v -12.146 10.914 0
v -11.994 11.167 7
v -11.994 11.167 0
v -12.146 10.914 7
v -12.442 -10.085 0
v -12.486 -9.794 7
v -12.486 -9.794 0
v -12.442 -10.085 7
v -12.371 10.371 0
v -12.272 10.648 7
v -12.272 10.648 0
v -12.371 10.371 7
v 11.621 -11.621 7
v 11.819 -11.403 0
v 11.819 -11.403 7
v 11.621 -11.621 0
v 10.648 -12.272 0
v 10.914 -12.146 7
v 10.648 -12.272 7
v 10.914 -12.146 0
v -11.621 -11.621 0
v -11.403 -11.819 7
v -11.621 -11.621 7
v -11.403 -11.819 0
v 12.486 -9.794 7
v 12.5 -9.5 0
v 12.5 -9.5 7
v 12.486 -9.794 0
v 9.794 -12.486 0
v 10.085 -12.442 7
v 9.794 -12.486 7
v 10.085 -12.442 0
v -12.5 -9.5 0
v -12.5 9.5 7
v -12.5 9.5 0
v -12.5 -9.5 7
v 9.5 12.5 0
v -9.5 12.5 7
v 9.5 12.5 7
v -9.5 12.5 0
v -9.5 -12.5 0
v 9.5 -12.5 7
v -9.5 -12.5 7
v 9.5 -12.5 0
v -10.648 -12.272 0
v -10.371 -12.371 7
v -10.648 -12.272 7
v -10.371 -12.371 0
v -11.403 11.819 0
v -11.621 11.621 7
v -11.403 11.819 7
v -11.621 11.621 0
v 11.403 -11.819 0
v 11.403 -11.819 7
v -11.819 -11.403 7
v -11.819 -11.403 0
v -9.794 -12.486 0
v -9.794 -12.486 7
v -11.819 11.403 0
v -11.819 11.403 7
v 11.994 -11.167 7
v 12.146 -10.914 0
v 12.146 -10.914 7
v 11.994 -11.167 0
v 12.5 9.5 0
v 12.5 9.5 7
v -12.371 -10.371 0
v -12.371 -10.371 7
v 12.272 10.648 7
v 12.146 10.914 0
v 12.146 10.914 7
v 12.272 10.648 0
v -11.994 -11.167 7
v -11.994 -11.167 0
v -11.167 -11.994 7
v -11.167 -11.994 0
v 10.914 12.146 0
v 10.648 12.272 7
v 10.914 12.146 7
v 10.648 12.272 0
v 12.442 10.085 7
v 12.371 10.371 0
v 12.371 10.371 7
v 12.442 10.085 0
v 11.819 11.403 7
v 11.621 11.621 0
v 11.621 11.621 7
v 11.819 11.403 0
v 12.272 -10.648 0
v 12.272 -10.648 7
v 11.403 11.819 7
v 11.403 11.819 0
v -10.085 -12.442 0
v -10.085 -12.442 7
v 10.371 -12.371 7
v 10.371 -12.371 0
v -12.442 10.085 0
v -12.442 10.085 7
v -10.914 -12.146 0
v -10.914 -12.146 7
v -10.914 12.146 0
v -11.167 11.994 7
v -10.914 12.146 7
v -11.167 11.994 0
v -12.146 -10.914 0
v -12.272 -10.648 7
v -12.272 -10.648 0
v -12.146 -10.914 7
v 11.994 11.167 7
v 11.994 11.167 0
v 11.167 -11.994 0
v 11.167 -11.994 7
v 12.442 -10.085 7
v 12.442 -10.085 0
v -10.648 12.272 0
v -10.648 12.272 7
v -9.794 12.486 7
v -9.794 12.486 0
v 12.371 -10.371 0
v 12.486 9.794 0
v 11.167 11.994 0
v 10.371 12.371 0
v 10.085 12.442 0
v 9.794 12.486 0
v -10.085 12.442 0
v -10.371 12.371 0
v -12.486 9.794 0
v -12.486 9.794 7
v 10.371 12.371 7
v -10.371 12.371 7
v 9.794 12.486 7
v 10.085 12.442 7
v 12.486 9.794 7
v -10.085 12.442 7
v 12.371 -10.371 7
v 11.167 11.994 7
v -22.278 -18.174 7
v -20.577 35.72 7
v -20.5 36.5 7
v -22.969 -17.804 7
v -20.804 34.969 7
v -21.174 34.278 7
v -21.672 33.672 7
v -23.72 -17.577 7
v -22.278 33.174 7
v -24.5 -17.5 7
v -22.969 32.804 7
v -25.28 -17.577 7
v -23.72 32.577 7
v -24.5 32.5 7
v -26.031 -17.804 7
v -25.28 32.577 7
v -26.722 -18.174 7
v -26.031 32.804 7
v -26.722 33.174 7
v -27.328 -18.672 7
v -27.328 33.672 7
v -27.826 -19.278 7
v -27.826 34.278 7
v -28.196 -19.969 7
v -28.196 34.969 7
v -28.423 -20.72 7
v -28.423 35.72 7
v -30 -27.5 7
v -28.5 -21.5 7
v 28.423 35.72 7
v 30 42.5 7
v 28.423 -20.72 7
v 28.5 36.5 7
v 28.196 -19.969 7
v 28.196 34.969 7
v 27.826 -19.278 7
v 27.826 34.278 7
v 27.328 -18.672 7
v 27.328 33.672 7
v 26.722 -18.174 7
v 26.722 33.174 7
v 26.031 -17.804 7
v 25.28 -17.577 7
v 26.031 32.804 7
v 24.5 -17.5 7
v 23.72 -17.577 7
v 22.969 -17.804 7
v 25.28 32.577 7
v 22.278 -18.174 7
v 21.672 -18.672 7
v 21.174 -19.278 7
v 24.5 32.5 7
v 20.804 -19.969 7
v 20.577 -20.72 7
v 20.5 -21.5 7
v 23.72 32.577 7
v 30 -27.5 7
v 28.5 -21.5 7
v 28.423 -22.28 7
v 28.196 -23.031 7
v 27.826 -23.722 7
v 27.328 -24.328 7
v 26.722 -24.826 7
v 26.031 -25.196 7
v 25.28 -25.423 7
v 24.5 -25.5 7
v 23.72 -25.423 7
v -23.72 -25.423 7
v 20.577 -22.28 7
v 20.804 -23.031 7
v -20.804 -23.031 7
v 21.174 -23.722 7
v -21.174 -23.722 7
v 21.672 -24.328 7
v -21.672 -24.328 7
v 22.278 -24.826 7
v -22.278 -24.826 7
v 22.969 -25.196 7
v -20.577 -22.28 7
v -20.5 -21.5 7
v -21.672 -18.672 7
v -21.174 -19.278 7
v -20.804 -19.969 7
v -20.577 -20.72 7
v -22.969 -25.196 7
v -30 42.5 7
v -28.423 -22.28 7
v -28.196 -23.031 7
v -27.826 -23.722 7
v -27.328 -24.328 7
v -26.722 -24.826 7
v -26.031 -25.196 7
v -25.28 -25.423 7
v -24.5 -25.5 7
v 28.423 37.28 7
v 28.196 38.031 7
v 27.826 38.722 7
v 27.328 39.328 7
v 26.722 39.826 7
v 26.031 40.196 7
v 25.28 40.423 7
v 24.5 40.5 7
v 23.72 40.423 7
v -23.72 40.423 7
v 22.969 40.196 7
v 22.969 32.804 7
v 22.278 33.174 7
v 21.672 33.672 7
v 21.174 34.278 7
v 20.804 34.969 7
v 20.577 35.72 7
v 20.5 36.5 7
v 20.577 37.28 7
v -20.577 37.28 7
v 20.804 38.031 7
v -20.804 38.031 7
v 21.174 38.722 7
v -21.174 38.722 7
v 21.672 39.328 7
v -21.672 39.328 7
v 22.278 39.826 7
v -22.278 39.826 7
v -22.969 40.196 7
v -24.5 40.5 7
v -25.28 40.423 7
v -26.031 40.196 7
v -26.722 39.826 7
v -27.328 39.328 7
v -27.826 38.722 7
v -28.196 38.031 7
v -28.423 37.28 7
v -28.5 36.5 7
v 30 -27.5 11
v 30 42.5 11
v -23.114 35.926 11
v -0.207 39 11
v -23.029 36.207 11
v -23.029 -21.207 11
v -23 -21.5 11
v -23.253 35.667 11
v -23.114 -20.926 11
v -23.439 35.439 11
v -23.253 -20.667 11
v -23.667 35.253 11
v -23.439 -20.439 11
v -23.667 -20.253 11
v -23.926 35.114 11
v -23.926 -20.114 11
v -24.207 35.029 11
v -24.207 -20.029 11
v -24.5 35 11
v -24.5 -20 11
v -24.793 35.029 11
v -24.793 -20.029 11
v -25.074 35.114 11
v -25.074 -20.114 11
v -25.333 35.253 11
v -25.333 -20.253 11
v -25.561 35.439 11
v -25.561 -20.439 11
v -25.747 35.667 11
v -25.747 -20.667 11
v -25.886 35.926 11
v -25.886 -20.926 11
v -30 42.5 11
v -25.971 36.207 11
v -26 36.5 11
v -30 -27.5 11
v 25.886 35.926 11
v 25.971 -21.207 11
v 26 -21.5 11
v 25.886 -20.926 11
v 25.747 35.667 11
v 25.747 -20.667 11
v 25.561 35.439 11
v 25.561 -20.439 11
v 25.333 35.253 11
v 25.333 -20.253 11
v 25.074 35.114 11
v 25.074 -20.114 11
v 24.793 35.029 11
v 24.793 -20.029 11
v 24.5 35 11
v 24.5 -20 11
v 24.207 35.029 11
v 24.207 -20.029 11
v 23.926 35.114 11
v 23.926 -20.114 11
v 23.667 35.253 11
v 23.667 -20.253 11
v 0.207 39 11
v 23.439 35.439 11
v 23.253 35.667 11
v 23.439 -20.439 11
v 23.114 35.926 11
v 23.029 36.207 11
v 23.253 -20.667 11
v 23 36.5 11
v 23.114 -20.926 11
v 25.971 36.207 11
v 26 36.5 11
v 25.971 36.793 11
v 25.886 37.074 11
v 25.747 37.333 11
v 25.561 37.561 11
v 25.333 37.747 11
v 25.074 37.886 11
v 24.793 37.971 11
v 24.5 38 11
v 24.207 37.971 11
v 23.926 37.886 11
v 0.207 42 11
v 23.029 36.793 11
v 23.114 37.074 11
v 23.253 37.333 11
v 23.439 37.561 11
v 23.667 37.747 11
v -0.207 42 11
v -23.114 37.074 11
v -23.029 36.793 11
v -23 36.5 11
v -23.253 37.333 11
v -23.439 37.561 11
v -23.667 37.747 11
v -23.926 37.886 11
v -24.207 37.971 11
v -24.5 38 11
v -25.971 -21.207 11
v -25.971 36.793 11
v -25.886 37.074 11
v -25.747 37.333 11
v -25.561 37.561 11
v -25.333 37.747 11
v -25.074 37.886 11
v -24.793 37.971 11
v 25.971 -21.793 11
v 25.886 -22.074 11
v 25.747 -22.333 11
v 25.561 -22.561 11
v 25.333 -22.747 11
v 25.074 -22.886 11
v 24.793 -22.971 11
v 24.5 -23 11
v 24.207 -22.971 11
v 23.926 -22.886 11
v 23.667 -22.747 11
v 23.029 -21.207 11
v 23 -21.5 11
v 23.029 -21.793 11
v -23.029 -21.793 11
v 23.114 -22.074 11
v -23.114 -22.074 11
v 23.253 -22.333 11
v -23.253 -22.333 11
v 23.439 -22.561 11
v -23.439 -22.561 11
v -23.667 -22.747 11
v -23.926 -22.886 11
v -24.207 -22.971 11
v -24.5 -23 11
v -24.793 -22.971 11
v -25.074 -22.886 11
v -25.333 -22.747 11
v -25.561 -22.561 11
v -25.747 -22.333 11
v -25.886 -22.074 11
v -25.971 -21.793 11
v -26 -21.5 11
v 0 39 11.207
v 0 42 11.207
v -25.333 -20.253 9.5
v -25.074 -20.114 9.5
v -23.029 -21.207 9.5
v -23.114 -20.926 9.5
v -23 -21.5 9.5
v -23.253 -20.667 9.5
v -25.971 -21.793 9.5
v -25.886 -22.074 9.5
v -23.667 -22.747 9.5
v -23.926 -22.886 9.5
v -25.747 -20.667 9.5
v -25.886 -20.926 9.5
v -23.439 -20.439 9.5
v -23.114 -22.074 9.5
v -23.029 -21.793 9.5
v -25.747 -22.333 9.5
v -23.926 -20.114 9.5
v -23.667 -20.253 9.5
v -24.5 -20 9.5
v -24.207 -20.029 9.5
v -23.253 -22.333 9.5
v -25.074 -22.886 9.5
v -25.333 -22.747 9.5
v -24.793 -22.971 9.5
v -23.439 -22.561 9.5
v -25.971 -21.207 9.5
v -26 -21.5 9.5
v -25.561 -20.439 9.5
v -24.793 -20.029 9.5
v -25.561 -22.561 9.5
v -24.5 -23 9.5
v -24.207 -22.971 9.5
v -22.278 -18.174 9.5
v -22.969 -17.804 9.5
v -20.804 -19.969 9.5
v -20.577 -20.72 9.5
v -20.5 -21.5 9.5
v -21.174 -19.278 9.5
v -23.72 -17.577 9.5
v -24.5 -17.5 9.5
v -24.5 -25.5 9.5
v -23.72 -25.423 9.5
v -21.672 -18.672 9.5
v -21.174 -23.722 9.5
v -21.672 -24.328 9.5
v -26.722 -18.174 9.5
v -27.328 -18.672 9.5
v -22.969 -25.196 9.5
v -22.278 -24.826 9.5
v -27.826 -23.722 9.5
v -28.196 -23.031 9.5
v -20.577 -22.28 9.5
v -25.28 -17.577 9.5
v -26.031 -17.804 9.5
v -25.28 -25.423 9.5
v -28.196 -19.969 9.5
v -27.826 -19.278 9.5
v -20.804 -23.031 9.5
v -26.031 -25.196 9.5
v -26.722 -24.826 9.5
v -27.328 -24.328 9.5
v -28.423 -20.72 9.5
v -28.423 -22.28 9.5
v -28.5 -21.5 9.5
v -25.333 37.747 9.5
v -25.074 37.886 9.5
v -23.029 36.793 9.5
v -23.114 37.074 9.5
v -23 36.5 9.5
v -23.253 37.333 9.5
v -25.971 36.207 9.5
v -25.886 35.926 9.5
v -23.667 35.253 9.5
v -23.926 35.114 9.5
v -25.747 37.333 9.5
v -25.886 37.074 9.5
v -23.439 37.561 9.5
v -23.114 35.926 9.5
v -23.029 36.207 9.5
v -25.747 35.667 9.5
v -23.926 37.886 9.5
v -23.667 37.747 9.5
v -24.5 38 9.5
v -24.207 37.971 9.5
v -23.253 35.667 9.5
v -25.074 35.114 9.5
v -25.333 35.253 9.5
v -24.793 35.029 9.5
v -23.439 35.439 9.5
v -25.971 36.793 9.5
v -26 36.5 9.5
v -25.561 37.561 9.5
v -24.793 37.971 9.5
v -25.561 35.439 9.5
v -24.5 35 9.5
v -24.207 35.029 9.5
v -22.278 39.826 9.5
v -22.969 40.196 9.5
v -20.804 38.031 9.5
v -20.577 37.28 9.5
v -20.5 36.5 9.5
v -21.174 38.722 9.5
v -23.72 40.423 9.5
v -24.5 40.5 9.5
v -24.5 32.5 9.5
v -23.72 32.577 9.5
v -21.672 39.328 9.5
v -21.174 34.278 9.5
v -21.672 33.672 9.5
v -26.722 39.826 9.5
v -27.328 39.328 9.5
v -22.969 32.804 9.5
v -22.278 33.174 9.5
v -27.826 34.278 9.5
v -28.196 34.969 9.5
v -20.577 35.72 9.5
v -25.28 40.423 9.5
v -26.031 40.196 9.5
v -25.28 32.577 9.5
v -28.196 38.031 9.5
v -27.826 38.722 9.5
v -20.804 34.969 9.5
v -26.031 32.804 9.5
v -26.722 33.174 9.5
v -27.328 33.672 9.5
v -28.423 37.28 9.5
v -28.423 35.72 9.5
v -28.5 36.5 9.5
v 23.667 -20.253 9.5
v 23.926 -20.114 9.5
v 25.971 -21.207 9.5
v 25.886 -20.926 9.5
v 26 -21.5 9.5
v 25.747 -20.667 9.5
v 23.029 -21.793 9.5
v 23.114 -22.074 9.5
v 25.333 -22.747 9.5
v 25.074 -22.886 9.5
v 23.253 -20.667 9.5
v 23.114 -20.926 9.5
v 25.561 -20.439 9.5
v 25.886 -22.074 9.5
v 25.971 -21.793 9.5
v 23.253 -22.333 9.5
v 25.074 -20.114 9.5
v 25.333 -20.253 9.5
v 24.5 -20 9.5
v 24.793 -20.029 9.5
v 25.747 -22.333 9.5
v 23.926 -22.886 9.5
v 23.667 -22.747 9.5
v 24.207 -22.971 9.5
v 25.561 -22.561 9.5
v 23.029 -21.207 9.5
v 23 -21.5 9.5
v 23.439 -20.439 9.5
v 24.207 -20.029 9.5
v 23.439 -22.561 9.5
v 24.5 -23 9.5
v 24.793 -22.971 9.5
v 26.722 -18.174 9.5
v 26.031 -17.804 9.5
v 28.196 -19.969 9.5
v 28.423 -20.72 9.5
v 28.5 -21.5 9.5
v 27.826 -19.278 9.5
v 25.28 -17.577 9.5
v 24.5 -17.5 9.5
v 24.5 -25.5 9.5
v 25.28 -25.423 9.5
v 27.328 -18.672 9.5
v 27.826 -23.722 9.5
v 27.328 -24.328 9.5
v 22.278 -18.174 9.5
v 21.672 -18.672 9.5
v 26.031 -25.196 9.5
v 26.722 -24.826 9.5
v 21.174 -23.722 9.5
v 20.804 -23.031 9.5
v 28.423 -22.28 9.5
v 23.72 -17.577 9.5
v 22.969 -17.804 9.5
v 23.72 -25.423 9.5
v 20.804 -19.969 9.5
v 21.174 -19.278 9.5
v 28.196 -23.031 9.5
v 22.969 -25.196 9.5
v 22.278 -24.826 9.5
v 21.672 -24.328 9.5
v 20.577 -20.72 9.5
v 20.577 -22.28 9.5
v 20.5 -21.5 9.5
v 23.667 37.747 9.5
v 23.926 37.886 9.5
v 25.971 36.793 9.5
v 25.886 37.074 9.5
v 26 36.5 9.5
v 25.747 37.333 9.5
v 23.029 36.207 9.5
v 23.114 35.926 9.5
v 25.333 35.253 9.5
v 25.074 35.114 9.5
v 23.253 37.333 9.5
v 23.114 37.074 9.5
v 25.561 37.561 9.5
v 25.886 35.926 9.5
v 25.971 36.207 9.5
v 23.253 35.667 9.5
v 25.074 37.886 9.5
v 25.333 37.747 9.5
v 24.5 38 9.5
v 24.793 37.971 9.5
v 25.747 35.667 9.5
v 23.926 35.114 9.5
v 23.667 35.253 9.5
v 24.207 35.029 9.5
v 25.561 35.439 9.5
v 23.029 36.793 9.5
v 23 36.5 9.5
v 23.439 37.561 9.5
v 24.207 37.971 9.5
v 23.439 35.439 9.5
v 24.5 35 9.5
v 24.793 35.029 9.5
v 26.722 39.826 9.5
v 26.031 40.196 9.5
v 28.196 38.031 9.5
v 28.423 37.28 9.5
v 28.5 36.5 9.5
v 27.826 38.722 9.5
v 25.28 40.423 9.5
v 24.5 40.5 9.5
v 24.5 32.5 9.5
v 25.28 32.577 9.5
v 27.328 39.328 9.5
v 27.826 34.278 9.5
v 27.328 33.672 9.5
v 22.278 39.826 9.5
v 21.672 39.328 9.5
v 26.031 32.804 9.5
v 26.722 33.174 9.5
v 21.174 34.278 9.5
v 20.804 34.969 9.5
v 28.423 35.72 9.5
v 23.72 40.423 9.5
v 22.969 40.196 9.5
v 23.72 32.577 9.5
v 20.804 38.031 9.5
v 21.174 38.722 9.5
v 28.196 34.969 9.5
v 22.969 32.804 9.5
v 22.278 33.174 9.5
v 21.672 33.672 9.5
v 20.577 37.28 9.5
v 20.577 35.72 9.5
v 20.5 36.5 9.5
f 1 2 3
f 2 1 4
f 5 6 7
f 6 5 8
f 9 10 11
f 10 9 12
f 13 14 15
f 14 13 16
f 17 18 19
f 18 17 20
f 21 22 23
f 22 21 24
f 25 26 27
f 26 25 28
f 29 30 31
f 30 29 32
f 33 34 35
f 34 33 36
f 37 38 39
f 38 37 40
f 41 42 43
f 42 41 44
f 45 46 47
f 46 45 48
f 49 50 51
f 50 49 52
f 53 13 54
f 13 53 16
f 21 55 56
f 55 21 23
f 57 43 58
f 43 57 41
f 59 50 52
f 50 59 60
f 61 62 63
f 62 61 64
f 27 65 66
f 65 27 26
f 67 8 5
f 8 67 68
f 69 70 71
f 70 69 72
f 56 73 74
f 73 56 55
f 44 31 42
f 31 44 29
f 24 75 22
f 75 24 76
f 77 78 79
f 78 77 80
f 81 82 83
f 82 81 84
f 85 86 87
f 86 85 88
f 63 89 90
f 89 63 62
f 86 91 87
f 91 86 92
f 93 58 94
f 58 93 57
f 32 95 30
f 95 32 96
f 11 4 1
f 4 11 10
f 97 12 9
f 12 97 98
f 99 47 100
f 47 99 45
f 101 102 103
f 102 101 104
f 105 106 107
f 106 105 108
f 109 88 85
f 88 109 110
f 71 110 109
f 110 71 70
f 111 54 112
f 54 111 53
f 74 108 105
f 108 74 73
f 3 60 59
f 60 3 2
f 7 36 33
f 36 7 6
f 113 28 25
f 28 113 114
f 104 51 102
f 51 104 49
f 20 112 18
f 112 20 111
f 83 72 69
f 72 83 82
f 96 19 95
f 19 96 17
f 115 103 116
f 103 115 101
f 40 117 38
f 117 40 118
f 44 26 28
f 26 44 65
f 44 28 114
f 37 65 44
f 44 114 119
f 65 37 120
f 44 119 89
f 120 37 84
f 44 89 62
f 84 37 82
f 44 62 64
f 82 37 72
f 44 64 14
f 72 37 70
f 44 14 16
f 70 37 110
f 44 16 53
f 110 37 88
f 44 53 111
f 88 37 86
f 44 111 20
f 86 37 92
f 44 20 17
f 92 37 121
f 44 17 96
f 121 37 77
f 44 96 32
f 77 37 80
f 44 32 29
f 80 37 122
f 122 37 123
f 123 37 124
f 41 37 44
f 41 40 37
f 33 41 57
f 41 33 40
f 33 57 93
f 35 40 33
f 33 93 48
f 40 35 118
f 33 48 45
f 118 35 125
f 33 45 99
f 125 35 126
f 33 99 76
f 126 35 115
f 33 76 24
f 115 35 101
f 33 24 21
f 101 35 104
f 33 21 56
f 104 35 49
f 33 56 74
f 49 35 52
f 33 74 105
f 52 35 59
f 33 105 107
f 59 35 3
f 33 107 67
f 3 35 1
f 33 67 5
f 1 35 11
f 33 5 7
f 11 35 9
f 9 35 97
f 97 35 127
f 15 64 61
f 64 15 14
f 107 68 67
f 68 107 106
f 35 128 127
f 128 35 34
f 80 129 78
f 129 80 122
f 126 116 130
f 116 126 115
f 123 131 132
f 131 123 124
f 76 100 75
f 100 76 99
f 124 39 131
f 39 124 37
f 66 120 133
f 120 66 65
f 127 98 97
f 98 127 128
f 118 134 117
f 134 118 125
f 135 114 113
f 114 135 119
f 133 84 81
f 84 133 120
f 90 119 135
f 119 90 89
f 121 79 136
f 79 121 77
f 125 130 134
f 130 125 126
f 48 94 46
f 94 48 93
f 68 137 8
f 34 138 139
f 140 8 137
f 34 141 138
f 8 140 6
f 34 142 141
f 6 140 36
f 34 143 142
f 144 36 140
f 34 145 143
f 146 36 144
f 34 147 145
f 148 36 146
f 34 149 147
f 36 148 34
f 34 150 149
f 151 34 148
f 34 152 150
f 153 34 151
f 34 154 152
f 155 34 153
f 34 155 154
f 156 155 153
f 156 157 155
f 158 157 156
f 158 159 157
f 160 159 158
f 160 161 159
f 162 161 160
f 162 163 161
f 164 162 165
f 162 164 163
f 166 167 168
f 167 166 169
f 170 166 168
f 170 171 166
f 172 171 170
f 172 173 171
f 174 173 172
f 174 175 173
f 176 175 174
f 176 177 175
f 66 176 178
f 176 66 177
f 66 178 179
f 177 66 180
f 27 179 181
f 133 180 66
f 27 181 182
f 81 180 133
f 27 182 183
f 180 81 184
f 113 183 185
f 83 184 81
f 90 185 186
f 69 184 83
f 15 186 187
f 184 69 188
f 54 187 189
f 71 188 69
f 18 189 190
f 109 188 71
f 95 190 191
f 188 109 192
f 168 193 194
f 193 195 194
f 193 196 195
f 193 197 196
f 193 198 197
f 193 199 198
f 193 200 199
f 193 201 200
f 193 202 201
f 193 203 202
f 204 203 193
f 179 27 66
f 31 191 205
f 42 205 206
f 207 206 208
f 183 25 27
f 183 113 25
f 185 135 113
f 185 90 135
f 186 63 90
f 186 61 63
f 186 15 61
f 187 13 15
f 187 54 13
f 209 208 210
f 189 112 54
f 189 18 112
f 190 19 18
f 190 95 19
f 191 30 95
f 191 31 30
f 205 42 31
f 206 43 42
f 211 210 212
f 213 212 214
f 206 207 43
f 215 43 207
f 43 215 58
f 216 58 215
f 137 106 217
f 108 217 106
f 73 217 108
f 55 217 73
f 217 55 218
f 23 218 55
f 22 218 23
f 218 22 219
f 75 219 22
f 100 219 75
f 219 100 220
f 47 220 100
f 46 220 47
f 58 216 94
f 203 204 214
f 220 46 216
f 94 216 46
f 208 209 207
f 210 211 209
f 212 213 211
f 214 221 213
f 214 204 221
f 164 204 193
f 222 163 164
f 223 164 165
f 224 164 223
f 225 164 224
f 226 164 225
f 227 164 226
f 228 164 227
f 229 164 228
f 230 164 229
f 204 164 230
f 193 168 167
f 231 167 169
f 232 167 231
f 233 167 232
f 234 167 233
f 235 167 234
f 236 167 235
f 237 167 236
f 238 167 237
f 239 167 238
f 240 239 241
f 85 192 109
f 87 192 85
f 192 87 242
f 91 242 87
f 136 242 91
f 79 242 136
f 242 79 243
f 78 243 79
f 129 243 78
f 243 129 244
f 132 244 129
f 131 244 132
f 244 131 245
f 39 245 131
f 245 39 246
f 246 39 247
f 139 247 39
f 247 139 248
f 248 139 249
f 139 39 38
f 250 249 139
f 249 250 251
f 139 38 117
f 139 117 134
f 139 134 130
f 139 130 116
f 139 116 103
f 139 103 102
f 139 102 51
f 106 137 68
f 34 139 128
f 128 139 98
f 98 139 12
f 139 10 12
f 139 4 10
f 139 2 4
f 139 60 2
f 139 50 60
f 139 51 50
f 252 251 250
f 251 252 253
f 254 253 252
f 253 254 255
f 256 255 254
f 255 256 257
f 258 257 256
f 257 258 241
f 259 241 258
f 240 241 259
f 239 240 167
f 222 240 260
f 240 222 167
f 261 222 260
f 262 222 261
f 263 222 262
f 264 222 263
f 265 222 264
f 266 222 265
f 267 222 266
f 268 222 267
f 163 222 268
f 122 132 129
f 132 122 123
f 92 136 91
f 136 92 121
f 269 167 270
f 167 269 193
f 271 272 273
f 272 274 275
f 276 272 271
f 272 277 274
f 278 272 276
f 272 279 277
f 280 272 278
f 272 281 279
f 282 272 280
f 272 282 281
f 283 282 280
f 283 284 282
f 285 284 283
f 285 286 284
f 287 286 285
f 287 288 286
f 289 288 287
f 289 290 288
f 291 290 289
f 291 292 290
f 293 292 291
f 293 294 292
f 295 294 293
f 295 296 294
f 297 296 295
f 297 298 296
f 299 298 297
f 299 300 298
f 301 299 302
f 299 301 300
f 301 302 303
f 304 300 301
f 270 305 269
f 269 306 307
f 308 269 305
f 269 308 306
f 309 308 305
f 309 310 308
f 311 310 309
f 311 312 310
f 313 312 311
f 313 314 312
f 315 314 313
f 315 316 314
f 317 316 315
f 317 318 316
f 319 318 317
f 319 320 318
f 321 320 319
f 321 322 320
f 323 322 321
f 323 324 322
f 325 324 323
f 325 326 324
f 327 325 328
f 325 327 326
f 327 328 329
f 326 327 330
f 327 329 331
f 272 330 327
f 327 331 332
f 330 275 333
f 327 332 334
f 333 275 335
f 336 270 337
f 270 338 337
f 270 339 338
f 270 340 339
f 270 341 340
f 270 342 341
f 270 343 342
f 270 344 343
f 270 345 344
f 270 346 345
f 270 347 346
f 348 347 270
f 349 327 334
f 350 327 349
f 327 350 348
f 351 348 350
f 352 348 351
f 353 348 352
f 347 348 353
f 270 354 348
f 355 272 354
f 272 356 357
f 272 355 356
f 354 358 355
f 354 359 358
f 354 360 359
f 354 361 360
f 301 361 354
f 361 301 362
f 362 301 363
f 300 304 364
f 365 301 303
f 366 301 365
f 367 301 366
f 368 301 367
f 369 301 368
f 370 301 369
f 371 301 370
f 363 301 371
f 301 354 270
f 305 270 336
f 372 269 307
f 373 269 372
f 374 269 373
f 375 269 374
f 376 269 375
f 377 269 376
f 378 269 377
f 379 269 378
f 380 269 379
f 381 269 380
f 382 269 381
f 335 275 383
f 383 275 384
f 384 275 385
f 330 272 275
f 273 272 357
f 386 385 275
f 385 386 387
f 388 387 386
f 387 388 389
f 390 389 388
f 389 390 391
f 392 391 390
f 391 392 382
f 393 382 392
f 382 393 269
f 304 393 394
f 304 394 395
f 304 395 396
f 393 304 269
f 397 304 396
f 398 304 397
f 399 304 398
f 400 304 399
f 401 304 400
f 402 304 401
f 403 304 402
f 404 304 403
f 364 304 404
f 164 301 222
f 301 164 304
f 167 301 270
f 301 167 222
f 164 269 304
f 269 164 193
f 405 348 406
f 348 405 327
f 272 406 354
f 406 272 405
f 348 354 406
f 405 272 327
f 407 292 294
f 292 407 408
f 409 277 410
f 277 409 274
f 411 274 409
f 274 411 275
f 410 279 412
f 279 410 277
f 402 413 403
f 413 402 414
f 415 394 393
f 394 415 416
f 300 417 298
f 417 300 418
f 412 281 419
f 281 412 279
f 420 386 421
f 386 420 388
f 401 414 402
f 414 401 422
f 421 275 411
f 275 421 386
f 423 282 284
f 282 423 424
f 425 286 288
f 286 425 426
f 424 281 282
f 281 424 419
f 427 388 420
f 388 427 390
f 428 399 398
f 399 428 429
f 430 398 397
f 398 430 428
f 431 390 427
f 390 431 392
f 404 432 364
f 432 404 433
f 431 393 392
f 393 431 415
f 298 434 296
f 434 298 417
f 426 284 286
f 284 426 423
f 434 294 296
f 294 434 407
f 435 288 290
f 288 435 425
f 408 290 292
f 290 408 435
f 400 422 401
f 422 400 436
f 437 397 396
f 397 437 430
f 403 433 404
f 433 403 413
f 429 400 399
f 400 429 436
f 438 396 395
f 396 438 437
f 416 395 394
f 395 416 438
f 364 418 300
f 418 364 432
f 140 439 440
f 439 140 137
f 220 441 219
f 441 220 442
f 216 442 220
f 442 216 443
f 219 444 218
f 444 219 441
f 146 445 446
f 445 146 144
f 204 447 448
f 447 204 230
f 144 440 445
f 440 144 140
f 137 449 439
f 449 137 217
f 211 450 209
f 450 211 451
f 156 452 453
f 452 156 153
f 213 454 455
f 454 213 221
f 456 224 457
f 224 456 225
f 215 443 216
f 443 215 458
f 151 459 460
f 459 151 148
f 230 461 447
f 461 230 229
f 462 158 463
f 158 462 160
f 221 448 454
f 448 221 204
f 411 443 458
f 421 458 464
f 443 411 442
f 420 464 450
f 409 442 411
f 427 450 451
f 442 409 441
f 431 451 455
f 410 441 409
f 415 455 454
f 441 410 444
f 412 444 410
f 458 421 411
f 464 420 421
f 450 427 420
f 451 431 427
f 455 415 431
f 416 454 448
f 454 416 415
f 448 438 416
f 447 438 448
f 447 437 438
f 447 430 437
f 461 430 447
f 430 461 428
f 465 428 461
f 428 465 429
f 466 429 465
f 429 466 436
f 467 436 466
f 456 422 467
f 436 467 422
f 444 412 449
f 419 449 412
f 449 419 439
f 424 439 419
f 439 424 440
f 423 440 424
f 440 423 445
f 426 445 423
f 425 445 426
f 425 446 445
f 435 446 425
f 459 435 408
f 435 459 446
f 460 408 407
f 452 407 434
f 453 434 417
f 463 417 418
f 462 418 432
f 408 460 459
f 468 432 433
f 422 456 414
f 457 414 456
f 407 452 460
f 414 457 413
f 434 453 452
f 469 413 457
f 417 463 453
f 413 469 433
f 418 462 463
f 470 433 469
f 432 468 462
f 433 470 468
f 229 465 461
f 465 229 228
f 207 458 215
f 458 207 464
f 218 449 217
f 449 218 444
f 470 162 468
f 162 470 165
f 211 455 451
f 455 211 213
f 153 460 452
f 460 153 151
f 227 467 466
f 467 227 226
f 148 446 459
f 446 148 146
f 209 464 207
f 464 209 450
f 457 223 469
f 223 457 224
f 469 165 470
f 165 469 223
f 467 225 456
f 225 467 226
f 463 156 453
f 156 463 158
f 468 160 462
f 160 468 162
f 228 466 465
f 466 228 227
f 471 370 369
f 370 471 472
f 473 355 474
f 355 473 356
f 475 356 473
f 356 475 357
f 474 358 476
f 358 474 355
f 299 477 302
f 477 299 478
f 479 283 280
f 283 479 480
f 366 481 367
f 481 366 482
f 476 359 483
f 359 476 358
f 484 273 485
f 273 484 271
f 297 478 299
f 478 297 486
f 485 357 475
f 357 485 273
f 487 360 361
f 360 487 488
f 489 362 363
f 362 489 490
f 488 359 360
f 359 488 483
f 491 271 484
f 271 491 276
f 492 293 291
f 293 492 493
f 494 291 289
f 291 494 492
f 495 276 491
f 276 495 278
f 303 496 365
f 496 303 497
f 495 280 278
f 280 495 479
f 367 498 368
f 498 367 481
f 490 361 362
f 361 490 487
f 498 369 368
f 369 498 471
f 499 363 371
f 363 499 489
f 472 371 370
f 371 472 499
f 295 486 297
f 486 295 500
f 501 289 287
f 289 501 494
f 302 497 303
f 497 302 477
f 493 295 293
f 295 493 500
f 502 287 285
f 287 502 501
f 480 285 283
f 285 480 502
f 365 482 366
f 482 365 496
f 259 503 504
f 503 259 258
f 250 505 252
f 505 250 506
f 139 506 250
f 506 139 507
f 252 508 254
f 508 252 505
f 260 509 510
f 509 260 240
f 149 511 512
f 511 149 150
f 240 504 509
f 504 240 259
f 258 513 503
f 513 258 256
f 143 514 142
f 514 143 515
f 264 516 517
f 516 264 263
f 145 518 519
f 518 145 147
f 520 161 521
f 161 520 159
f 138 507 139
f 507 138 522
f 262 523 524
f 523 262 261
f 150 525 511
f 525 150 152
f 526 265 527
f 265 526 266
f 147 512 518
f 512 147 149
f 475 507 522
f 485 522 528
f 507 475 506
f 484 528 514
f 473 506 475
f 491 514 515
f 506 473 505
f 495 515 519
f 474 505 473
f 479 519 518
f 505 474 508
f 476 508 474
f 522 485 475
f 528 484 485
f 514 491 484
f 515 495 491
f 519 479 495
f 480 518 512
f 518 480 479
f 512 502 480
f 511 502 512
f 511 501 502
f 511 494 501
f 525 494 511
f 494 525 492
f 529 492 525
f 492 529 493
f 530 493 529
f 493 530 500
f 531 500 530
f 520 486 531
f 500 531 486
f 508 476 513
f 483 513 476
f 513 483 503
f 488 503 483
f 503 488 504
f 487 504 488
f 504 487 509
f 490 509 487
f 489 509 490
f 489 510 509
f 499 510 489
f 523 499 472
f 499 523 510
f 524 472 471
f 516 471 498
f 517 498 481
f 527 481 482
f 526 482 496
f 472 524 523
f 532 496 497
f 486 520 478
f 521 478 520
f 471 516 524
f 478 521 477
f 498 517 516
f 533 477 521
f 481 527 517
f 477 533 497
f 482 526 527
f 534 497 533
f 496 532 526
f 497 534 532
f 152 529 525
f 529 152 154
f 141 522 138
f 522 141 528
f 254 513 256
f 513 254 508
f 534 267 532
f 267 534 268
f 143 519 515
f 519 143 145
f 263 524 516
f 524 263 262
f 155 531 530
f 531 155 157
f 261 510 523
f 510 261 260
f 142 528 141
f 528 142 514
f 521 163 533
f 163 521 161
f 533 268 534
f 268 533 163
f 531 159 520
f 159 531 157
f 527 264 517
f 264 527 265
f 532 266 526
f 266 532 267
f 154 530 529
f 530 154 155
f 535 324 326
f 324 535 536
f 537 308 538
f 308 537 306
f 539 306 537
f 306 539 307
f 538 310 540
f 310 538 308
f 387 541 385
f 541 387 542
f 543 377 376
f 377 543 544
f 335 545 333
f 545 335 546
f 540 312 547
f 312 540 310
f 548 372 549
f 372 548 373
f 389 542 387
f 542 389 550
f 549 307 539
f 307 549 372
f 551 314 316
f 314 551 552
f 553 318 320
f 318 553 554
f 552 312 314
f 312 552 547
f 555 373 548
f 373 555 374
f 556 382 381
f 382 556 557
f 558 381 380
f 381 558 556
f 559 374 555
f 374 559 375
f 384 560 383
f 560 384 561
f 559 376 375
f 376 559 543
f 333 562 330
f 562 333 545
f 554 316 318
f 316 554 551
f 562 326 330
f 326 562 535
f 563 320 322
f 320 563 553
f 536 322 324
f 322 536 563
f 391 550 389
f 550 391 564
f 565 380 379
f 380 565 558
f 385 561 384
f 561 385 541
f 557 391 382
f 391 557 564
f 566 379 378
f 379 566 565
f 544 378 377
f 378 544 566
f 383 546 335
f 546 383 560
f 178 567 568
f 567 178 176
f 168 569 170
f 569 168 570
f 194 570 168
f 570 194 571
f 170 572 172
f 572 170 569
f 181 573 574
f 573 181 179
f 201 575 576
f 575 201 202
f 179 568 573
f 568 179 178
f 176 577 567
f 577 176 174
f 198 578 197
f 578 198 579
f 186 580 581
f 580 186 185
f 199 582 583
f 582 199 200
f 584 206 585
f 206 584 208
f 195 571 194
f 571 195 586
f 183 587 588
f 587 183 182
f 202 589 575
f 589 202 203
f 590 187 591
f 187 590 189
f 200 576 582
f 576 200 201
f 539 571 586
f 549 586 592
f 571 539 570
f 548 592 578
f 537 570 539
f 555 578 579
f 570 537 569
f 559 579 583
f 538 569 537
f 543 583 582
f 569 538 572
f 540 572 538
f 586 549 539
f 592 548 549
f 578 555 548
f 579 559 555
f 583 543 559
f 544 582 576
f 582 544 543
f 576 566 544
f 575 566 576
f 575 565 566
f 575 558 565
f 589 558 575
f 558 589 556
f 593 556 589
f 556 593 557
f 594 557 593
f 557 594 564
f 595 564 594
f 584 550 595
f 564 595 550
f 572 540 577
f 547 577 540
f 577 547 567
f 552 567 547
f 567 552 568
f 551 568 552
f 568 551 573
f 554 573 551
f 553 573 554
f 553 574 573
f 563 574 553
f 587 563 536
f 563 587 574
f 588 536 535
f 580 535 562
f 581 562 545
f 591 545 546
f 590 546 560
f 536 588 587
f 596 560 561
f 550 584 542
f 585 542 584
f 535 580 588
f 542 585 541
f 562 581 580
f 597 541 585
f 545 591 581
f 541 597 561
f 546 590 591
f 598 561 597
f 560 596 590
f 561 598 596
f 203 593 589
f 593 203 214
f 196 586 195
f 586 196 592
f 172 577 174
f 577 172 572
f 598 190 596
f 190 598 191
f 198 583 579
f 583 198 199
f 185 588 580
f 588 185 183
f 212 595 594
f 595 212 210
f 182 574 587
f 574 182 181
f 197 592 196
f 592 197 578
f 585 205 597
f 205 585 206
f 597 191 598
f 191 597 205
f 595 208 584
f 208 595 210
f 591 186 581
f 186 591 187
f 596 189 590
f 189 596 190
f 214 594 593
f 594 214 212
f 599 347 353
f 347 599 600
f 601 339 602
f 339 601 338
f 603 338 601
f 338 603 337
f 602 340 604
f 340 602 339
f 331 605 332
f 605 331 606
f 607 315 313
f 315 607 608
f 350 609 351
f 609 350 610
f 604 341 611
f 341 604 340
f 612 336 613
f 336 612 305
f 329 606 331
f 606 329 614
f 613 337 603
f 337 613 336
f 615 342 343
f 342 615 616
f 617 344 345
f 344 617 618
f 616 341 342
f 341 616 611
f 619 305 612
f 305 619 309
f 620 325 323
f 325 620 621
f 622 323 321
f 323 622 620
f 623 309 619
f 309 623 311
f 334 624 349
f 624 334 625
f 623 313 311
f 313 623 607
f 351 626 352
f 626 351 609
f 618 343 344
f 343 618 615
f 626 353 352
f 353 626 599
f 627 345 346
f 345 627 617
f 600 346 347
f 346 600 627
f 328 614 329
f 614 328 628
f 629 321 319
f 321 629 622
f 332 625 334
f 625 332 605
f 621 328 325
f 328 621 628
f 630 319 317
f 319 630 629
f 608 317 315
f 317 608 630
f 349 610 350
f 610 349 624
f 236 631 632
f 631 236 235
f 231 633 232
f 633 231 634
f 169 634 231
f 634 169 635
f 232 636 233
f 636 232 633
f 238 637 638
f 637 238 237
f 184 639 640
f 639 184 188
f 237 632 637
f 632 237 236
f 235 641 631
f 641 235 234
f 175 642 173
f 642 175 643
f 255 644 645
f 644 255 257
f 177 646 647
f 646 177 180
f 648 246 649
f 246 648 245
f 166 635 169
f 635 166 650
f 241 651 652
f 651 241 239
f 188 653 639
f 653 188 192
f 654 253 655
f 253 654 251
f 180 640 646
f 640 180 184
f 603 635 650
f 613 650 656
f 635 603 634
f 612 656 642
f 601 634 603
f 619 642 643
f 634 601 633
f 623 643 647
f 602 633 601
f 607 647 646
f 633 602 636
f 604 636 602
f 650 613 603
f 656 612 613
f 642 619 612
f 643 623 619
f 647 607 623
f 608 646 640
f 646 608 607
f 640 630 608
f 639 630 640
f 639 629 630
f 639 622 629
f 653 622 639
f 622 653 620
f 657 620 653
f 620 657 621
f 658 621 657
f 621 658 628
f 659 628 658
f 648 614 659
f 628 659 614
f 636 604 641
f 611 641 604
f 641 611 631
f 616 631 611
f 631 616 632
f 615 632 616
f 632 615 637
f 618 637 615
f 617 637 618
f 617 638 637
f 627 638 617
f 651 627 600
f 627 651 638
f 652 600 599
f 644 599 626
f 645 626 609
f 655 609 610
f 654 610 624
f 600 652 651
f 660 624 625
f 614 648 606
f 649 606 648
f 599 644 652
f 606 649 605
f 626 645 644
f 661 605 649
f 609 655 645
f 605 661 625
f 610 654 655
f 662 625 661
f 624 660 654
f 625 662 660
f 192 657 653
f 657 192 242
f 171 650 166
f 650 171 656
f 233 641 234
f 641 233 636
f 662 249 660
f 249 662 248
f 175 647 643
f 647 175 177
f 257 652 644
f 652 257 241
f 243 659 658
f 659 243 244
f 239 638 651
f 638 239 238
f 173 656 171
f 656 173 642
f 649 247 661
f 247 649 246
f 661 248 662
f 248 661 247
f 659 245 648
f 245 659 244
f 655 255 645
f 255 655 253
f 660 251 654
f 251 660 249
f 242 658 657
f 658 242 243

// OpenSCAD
// file: parts/support_column.scad
/*
 * Nomad Core - Support Column Module
 * Reusable support structure with rounded edges
 * 
 * Parameters are passed as function arguments
 */

// ============================================
// SUPPORT COLUMN MODULE
// ============================================
// Parameters:
// - size: footprint size (e.g., 25mm)
// - height: column height (e.g., 7mm)
// - corner_radius: rounded corner radius (e.g., 3mm)

module support_column(size=25, height=7, corner_radius=3) {
    // Solid hull with rounded corners
    hull() {
        // Four rounded corners
        for (x = [-1, 1]) {
            for (y = [-1, 1]) {
                translate([
                    x * (size/2 - corner_radius),
                    y * (size/2 - corner_radius),
                    0
                ])
                    cylinder(h=height, r=corner_radius, center=true);
            }
        }
    }
}

support_column();
// file: parts/screw_cutout.scad
/*
 * Nomad Core - Screw Cutout Module
 * M2.5 screw hole with hex nut recess access from bottom
 * 
 * Screw specs: M2.5 threading, 16mm long, TR8 hex head
 */

// ============================================
// MODULE: SCREW CUTOUT
// ============================================
module screw_cutout() {
    union() {
        // Screw shaft hole (3mm diameter, 25mm tall)
        // Full height to allow screw to pass through
        cylinder(h=25, d=3, center=false);
        
        // Hex nut recess (8mm diameter, 6mm tall)
        // Starts 4.5mm from bottom to create nut pocket
        translate([0, 0, 4.5])
            cylinder(h=6, d=8, center=false);
    }
}

// ============================================
// RENDER QUALITY
// ============================================
$fn = 32;

// ============================================
// TEST RENDER (comment out when using as module)
// ============================================
// Render the cutout for visualization
screw_cutout();

// Show a reference cube to see the cutout in context
%translate([0, 0, 5])
    cube([15, 15, 5], center=true);

// ============================================
// INFO OUTPUT
// ============================================
echo("=== SCREW CUTOUT SPECIFICATIONS ===");
echo("Screw standard: M2.5");
echo("Screw length: 16mm");
echo("Hex head: TR8");
echo("");
echo("Shaft hole: 3mm diameter x 25mm height");
echo("Nut recess: 8mm diameter x 6mm height (starts at 4.5mm)");
echo("");
echo("Usage: difference() { your_part(); screw_cutout(); }");
// main file
/*
 * Nomad Core - Initial Baseplate v1.0
 * Connects puck to Raspberry Pi 3B+
 * 
 * Design: 25x25mm support structure with rounded edges, 6.5mm clearance
 * Baseplate: 60mm wide x 70mm long, offset 7.5mm towards puck back (rounded edge)
 */

// Import reusable modules
use <parts/screw_cutout.scad>
use <parts/support_column.scad>

// ============================================
// BASEPLATE DIMENSIONS
// ============================================
// Raspberry Pi 3B+ dimensions and mounting
pi_width = 60.0;           // Baseplate width (X dimension, left-right)
pi_length = 70.0;          // Baseplate length (Y dimension, front-back)

// Hole edge offsets (measured from edges)
hole_offset_from_edge_x = 5.5;  // Distance from left/right edges (width/X direction)
hole_offset_from_edge_y = 6.0;  // Distance from front/back edges (length/Y direction)

// Calculated hole spacing (for reference)
pi_hole_spacing_x = 2 * (pi_width/2 - hole_offset_from_edge_x);   // 60-5.5-5.5 = 49mm (X/width)
pi_hole_spacing_y = 2 * (pi_length/2 - hole_offset_from_edge_y);  // 70-6-6 = 58mm (Y/length)

// Support structure (puck to baseplate)
support_size = 25.0;       // 25x25mm footprint on puck top
support_height = 7.0;      // Clearance above puck
support_thickness = 3.0;   // Wall thickness of support structure
support_corner_radius = 3.0;  // Rounded edges on support column

// Baseplate positioning (offset towards back/rounded edge of puck)
baseplate_offset_y = 7.5;  // Offset towards back (5-10mm range)

// Baseplate 
baseplate_width = pi_width;
baseplate_length = pi_length;
baseplate_thickness = 4.0; // Thickness of main platform

// Screw cutout positioning
screw_inset_from_bottom = -8.0;  // Hex nut recess inset from bottom

// ============================================
// RENDER QUALITY
// ============================================
$fn = 64;

// ============================================
// MAIN BASEPLATE
// ============================================
module baseplate_body() {
    // Main platform
    // Cube is [X, Y, Z] where X=width (left-right), Y=length (front-back)
    cube([baseplate_width, baseplate_length, baseplate_thickness], center=true);
}

// ============================================
// RASPBERRY PI MOUNTING HOLES (Pi 3B+ spacing)
// ============================================
module pi_mounting_holes() {
    // Calculate hole positions from baseplate center
    // Baseplate cube is [width, length, thickness] = [X, Y, Z]
    // So X dimension = width (60mm), Y dimension = length (70mm)
    
    // Holes are 5.5mm from left/right edges (width/X direction)
    hole_pos_x = baseplate_width/2 - hole_offset_from_edge_x;   // 60/2 - 5.5 = 24.5mm
    
    // Holes are 6mm from front/back edges (length/Y direction)  
    hole_pos_y = baseplate_length/2 - hole_offset_from_edge_y;  // 70/2 - 6 = 29mm
    
    for (x = [-1, 1]) {
        for (y = [-1, 1]) {
            translate([
                x * hole_pos_x,  // ±24.5mm in X (width direction)
                y * hole_pos_y,  // ±29mm in Y (length direction)
                -baseplate_thickness/2 + screw_inset_from_bottom
            ])
                screw_cutout();
        }
    }
}

// ============================================
// MAIN ASSEMBLY MODULE
// ============================================
module baseplate_initial() {
    difference() {
        union() {
            // Support column (centered at origin, bottom at z=0)
            translate([0, 0, support_height/2])
                support_column(support_size, support_height, support_corner_radius);
            
            // Baseplate platform (offset towards back/rounded edge of puck)
            translate([0, baseplate_offset_y, support_height + baseplate_thickness/2])
                baseplate_body();
            
            // Alignment marker (small notch for orientation on front edge)
            translate([0, baseplate_offset_y + baseplate_length/2 - 2, support_height + baseplate_thickness - 0.5])
                rotate([0, 45, 0])
                cube([1, 3, 1], center=true);
        }
        
        // Cut mounting holes from top (with baseplate offset)
        translate([0, baseplate_offset_y, support_height + baseplate_thickness/2])
            pi_mounting_holes();
    }
}

// ============================================
// RENDER (when file is opened directly)
// ============================================
baseplate_initial();

// ============================================
// INFO OUTPUT
// ============================================
echo("=== INITIAL BASEPLATE v1.0 - Pi 3B+ ===");
echo(str("Baseplate: ", baseplate_width, "mm (W) x ", baseplate_length, "mm (L) x ", baseplate_thickness, "mm (H)"));
echo(str("Support structure: ", support_size, " x ", support_size, " x ", support_height, " mm (rounded corners)"));
echo(str("Baseplate offset (towards puck back): ", baseplate_offset_y, " mm (Y direction)"));
echo(str("Total height: ", support_height + baseplate_thickness, " mm"));
echo(str("Pi 3B+ mounting hole spacing: ", pi_hole_spacing_x, "mm (X) x ", pi_hole_spacing_y, "mm (Y)"));
echo(str("Hole edge offsets: ", hole_offset_from_edge_x, "mm (left/right/X), ", hole_offset_from_edge_y, "mm (front/back/Y)"));
echo("");
echo("Screw spec: M2.5 x 16mm with TR8 hex head");
echo(str("Hex nut recess inset: ", screw_inset_from_bottom, " mm from bottom"));
echo("Orientation: Offset towards rounded edge (back) of puck");
